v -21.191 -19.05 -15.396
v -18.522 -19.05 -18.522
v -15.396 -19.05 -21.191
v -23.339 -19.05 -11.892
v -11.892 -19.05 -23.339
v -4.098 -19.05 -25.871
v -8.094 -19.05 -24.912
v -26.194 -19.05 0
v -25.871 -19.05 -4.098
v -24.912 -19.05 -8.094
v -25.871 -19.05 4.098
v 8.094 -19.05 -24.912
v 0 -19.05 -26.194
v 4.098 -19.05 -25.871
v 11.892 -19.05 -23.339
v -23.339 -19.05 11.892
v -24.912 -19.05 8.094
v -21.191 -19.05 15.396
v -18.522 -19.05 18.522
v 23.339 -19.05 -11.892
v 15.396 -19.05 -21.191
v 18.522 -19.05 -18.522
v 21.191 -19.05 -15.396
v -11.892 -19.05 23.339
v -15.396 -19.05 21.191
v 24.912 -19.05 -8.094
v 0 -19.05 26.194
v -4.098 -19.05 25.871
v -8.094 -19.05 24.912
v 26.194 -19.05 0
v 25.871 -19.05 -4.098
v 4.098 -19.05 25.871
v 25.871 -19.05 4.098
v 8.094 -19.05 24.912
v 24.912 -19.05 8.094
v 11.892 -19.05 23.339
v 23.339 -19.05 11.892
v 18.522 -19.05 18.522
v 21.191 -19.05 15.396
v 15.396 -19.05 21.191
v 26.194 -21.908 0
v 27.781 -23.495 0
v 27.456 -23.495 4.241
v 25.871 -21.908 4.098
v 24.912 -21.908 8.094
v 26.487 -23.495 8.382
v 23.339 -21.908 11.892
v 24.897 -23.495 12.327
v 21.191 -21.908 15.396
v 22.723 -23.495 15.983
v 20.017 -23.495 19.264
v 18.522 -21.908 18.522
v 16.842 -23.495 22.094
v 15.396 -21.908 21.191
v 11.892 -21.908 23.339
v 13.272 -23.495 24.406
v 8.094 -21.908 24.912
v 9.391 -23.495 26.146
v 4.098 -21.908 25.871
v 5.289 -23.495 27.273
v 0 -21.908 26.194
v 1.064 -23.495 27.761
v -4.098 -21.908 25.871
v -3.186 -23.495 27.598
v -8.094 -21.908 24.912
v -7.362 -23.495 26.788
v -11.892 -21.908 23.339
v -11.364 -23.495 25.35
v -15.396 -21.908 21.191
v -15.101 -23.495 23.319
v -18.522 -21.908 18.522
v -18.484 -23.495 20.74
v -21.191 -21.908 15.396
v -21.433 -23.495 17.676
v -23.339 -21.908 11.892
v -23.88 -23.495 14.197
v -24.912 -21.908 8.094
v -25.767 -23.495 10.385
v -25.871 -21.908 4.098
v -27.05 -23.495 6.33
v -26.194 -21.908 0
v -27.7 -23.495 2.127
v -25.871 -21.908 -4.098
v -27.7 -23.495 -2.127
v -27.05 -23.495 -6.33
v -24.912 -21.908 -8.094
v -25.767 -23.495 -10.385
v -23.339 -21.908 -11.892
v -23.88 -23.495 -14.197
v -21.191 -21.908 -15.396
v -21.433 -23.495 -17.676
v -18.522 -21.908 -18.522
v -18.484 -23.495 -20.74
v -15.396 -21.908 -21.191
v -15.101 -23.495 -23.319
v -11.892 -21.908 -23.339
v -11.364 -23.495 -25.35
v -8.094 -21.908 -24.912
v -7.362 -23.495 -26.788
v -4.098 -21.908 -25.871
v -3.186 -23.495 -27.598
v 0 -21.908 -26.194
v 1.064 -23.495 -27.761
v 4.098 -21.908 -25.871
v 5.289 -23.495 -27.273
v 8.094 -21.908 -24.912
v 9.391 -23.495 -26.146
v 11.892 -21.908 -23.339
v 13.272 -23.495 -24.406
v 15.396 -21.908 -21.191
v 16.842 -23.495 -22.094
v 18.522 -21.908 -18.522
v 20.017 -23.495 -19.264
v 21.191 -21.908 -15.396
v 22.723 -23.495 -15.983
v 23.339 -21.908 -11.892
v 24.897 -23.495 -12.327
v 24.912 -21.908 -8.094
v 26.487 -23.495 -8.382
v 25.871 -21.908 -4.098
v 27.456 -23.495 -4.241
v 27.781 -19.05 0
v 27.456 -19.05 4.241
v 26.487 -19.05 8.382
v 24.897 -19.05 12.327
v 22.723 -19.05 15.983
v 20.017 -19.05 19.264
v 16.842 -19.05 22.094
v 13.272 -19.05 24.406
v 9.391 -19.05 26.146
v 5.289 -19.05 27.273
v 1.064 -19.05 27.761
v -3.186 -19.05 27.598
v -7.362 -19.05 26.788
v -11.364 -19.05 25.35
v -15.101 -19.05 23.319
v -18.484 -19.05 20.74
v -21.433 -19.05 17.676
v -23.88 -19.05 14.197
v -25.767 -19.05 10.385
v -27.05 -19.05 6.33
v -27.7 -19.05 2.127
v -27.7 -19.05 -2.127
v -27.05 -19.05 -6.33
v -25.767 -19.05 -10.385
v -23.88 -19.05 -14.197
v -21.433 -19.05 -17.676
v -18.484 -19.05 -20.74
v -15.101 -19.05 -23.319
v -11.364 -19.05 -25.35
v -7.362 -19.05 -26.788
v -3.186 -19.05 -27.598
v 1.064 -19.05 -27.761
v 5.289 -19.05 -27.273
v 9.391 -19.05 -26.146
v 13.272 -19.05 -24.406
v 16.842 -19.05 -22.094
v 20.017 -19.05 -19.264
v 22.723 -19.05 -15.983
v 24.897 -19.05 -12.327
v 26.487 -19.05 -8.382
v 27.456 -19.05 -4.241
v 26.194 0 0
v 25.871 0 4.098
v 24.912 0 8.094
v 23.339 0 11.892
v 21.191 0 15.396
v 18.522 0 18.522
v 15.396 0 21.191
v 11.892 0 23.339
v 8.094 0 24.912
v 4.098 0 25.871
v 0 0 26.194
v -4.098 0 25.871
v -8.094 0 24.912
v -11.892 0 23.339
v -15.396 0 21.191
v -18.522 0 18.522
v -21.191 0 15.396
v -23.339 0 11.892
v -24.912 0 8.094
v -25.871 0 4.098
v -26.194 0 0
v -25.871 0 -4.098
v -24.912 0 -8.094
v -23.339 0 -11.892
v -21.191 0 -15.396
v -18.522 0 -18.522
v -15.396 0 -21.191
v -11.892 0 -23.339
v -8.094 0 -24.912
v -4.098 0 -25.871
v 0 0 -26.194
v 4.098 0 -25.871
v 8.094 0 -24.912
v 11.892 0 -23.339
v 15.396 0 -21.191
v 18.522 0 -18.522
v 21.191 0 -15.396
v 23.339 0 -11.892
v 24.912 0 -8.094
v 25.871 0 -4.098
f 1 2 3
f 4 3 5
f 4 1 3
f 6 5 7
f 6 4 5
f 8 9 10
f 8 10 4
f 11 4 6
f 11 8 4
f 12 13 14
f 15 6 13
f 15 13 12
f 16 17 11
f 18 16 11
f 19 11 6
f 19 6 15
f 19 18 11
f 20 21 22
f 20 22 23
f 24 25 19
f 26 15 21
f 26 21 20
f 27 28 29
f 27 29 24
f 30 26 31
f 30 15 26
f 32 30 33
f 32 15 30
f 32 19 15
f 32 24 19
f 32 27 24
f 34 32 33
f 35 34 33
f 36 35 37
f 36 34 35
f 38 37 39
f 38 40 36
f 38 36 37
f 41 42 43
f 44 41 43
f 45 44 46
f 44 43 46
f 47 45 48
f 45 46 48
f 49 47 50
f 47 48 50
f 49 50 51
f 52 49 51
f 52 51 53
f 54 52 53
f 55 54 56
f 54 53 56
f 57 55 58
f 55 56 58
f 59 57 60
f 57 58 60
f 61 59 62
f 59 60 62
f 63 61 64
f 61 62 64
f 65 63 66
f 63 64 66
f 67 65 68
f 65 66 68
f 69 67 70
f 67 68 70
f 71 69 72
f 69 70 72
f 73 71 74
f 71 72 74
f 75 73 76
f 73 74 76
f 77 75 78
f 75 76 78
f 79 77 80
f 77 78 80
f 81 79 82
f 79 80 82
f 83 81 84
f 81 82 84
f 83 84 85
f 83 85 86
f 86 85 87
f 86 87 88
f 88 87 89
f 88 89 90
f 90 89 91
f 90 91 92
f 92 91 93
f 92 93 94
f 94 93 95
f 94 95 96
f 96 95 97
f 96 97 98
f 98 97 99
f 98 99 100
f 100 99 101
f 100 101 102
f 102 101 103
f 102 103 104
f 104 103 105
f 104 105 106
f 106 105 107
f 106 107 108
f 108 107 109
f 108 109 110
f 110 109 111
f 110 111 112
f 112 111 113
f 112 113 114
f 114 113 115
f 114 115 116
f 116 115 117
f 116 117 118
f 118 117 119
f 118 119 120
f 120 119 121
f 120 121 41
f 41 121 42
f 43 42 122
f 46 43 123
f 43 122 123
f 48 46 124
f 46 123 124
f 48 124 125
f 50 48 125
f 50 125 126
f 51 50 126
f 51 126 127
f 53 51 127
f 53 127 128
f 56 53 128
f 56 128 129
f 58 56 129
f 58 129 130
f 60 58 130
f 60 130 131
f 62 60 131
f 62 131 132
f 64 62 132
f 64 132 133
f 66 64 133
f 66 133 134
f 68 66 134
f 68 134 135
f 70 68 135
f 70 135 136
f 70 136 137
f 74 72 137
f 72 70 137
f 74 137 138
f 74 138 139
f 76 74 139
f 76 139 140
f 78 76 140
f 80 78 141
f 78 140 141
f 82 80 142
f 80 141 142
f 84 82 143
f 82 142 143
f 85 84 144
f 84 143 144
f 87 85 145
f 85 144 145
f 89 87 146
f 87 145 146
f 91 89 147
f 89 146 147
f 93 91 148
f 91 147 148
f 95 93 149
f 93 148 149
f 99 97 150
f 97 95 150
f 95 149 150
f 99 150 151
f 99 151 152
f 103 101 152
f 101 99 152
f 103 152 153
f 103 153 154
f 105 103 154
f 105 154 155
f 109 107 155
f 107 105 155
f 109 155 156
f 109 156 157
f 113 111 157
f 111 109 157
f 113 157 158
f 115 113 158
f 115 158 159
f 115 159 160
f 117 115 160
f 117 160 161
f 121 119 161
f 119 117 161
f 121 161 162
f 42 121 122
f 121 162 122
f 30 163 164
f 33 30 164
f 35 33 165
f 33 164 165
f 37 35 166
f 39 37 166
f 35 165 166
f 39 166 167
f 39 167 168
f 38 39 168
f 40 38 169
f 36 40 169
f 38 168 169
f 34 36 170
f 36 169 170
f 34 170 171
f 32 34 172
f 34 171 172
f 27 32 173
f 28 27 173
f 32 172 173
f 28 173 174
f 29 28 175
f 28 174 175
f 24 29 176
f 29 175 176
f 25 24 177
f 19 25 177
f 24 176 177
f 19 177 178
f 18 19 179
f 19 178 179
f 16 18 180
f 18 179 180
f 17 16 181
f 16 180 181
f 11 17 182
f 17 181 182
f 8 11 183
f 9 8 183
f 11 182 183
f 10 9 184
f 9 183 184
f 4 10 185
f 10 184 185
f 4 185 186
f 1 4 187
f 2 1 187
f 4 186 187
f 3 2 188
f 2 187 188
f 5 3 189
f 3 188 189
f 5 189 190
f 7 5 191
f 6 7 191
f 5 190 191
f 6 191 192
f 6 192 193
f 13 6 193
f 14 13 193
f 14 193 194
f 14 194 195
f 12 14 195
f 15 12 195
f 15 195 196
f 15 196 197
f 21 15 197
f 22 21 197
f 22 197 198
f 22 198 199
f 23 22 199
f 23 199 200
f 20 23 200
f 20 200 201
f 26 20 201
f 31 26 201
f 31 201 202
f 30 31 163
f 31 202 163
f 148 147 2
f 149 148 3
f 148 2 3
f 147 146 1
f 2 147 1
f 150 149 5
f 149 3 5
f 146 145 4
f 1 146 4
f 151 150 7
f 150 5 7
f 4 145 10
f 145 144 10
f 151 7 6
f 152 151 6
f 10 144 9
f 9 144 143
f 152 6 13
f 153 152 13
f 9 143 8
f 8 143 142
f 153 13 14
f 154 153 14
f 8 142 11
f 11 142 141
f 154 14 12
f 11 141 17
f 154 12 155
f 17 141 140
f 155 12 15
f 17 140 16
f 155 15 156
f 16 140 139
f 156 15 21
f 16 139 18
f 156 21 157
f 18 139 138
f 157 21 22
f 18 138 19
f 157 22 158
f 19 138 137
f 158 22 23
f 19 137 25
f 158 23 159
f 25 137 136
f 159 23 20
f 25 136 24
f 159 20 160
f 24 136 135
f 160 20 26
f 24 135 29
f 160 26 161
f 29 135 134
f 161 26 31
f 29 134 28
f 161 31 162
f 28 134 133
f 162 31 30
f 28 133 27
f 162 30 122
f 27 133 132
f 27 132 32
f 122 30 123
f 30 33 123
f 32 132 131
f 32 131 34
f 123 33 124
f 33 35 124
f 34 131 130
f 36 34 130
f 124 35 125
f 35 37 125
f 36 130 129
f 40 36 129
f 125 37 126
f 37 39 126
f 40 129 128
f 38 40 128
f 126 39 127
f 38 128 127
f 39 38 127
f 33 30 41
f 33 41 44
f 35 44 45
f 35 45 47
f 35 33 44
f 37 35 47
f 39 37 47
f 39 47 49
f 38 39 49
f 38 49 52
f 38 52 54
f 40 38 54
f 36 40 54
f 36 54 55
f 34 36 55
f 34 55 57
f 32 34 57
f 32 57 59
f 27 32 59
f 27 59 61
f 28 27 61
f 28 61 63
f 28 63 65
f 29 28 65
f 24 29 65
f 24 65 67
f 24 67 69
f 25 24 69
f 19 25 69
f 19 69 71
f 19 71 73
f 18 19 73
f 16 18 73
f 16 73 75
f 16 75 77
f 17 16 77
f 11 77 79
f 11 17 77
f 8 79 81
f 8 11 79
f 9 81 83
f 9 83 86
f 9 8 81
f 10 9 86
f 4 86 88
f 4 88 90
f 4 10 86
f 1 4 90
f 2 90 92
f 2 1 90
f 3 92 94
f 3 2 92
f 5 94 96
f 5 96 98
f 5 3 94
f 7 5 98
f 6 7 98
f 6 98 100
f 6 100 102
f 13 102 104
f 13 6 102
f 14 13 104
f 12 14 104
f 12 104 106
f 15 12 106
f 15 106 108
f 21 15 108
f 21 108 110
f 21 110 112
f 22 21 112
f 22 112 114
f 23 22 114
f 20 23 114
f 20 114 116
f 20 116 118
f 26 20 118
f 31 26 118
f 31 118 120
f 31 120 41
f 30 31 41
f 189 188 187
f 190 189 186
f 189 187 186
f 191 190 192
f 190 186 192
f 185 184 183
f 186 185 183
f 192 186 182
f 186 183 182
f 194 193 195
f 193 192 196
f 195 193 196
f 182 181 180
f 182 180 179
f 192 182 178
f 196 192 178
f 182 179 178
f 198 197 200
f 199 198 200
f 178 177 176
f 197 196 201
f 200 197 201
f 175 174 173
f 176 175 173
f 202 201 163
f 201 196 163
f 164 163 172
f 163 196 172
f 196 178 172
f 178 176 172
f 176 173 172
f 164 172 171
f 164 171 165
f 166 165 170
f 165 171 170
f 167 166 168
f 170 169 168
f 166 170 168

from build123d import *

# Parameters (mm, degrees)
F0_R     = 26.19375
F1_DEPTH = 19.05
F2_R     = 27.78125
F2_R_2   = 26.19375
F3_DEPTH = 7.9375


# Not quite as in the source:
# - a fillet or chamfer that OpenCascade refuses, or shapes differently, is made with other operations: its cross-section is extruded or revolved along the edge and cut away or added


with BuildPart() as f1:
    # F0 (on Front) → F1 (new body)
    with BuildSketch(Plane.XZ):
        Circle(F0_R)
    extrude(amount=F1_DEPTH)


with BuildPart() as f3:
    # F2 (on face) → F3 (new body)
    with BuildSketch(Plane.XZ.offset(19.05)):
        Circle(F2_R)
        Circle(F2_R_2, mode=Mode.SUBTRACT)
    extrude(amount=F3_DEPTH)

    # F4: chamfer of 5.08 on 1 edges, made by hand

    # F4_s1 → F4_t2 (revolve, cut)
    with BuildSketch(Plane.XY):
        Polygon((26.19375, -21.9075), (31.27375, -26.9875), (26.19375, -26.9875), align=None)
    revolve(axis=Axis((0, -26.9875, 0), (0, -1, 0)), mode=Mode.SUBTRACT)


solid = Compound([f1.part, f3.part])
